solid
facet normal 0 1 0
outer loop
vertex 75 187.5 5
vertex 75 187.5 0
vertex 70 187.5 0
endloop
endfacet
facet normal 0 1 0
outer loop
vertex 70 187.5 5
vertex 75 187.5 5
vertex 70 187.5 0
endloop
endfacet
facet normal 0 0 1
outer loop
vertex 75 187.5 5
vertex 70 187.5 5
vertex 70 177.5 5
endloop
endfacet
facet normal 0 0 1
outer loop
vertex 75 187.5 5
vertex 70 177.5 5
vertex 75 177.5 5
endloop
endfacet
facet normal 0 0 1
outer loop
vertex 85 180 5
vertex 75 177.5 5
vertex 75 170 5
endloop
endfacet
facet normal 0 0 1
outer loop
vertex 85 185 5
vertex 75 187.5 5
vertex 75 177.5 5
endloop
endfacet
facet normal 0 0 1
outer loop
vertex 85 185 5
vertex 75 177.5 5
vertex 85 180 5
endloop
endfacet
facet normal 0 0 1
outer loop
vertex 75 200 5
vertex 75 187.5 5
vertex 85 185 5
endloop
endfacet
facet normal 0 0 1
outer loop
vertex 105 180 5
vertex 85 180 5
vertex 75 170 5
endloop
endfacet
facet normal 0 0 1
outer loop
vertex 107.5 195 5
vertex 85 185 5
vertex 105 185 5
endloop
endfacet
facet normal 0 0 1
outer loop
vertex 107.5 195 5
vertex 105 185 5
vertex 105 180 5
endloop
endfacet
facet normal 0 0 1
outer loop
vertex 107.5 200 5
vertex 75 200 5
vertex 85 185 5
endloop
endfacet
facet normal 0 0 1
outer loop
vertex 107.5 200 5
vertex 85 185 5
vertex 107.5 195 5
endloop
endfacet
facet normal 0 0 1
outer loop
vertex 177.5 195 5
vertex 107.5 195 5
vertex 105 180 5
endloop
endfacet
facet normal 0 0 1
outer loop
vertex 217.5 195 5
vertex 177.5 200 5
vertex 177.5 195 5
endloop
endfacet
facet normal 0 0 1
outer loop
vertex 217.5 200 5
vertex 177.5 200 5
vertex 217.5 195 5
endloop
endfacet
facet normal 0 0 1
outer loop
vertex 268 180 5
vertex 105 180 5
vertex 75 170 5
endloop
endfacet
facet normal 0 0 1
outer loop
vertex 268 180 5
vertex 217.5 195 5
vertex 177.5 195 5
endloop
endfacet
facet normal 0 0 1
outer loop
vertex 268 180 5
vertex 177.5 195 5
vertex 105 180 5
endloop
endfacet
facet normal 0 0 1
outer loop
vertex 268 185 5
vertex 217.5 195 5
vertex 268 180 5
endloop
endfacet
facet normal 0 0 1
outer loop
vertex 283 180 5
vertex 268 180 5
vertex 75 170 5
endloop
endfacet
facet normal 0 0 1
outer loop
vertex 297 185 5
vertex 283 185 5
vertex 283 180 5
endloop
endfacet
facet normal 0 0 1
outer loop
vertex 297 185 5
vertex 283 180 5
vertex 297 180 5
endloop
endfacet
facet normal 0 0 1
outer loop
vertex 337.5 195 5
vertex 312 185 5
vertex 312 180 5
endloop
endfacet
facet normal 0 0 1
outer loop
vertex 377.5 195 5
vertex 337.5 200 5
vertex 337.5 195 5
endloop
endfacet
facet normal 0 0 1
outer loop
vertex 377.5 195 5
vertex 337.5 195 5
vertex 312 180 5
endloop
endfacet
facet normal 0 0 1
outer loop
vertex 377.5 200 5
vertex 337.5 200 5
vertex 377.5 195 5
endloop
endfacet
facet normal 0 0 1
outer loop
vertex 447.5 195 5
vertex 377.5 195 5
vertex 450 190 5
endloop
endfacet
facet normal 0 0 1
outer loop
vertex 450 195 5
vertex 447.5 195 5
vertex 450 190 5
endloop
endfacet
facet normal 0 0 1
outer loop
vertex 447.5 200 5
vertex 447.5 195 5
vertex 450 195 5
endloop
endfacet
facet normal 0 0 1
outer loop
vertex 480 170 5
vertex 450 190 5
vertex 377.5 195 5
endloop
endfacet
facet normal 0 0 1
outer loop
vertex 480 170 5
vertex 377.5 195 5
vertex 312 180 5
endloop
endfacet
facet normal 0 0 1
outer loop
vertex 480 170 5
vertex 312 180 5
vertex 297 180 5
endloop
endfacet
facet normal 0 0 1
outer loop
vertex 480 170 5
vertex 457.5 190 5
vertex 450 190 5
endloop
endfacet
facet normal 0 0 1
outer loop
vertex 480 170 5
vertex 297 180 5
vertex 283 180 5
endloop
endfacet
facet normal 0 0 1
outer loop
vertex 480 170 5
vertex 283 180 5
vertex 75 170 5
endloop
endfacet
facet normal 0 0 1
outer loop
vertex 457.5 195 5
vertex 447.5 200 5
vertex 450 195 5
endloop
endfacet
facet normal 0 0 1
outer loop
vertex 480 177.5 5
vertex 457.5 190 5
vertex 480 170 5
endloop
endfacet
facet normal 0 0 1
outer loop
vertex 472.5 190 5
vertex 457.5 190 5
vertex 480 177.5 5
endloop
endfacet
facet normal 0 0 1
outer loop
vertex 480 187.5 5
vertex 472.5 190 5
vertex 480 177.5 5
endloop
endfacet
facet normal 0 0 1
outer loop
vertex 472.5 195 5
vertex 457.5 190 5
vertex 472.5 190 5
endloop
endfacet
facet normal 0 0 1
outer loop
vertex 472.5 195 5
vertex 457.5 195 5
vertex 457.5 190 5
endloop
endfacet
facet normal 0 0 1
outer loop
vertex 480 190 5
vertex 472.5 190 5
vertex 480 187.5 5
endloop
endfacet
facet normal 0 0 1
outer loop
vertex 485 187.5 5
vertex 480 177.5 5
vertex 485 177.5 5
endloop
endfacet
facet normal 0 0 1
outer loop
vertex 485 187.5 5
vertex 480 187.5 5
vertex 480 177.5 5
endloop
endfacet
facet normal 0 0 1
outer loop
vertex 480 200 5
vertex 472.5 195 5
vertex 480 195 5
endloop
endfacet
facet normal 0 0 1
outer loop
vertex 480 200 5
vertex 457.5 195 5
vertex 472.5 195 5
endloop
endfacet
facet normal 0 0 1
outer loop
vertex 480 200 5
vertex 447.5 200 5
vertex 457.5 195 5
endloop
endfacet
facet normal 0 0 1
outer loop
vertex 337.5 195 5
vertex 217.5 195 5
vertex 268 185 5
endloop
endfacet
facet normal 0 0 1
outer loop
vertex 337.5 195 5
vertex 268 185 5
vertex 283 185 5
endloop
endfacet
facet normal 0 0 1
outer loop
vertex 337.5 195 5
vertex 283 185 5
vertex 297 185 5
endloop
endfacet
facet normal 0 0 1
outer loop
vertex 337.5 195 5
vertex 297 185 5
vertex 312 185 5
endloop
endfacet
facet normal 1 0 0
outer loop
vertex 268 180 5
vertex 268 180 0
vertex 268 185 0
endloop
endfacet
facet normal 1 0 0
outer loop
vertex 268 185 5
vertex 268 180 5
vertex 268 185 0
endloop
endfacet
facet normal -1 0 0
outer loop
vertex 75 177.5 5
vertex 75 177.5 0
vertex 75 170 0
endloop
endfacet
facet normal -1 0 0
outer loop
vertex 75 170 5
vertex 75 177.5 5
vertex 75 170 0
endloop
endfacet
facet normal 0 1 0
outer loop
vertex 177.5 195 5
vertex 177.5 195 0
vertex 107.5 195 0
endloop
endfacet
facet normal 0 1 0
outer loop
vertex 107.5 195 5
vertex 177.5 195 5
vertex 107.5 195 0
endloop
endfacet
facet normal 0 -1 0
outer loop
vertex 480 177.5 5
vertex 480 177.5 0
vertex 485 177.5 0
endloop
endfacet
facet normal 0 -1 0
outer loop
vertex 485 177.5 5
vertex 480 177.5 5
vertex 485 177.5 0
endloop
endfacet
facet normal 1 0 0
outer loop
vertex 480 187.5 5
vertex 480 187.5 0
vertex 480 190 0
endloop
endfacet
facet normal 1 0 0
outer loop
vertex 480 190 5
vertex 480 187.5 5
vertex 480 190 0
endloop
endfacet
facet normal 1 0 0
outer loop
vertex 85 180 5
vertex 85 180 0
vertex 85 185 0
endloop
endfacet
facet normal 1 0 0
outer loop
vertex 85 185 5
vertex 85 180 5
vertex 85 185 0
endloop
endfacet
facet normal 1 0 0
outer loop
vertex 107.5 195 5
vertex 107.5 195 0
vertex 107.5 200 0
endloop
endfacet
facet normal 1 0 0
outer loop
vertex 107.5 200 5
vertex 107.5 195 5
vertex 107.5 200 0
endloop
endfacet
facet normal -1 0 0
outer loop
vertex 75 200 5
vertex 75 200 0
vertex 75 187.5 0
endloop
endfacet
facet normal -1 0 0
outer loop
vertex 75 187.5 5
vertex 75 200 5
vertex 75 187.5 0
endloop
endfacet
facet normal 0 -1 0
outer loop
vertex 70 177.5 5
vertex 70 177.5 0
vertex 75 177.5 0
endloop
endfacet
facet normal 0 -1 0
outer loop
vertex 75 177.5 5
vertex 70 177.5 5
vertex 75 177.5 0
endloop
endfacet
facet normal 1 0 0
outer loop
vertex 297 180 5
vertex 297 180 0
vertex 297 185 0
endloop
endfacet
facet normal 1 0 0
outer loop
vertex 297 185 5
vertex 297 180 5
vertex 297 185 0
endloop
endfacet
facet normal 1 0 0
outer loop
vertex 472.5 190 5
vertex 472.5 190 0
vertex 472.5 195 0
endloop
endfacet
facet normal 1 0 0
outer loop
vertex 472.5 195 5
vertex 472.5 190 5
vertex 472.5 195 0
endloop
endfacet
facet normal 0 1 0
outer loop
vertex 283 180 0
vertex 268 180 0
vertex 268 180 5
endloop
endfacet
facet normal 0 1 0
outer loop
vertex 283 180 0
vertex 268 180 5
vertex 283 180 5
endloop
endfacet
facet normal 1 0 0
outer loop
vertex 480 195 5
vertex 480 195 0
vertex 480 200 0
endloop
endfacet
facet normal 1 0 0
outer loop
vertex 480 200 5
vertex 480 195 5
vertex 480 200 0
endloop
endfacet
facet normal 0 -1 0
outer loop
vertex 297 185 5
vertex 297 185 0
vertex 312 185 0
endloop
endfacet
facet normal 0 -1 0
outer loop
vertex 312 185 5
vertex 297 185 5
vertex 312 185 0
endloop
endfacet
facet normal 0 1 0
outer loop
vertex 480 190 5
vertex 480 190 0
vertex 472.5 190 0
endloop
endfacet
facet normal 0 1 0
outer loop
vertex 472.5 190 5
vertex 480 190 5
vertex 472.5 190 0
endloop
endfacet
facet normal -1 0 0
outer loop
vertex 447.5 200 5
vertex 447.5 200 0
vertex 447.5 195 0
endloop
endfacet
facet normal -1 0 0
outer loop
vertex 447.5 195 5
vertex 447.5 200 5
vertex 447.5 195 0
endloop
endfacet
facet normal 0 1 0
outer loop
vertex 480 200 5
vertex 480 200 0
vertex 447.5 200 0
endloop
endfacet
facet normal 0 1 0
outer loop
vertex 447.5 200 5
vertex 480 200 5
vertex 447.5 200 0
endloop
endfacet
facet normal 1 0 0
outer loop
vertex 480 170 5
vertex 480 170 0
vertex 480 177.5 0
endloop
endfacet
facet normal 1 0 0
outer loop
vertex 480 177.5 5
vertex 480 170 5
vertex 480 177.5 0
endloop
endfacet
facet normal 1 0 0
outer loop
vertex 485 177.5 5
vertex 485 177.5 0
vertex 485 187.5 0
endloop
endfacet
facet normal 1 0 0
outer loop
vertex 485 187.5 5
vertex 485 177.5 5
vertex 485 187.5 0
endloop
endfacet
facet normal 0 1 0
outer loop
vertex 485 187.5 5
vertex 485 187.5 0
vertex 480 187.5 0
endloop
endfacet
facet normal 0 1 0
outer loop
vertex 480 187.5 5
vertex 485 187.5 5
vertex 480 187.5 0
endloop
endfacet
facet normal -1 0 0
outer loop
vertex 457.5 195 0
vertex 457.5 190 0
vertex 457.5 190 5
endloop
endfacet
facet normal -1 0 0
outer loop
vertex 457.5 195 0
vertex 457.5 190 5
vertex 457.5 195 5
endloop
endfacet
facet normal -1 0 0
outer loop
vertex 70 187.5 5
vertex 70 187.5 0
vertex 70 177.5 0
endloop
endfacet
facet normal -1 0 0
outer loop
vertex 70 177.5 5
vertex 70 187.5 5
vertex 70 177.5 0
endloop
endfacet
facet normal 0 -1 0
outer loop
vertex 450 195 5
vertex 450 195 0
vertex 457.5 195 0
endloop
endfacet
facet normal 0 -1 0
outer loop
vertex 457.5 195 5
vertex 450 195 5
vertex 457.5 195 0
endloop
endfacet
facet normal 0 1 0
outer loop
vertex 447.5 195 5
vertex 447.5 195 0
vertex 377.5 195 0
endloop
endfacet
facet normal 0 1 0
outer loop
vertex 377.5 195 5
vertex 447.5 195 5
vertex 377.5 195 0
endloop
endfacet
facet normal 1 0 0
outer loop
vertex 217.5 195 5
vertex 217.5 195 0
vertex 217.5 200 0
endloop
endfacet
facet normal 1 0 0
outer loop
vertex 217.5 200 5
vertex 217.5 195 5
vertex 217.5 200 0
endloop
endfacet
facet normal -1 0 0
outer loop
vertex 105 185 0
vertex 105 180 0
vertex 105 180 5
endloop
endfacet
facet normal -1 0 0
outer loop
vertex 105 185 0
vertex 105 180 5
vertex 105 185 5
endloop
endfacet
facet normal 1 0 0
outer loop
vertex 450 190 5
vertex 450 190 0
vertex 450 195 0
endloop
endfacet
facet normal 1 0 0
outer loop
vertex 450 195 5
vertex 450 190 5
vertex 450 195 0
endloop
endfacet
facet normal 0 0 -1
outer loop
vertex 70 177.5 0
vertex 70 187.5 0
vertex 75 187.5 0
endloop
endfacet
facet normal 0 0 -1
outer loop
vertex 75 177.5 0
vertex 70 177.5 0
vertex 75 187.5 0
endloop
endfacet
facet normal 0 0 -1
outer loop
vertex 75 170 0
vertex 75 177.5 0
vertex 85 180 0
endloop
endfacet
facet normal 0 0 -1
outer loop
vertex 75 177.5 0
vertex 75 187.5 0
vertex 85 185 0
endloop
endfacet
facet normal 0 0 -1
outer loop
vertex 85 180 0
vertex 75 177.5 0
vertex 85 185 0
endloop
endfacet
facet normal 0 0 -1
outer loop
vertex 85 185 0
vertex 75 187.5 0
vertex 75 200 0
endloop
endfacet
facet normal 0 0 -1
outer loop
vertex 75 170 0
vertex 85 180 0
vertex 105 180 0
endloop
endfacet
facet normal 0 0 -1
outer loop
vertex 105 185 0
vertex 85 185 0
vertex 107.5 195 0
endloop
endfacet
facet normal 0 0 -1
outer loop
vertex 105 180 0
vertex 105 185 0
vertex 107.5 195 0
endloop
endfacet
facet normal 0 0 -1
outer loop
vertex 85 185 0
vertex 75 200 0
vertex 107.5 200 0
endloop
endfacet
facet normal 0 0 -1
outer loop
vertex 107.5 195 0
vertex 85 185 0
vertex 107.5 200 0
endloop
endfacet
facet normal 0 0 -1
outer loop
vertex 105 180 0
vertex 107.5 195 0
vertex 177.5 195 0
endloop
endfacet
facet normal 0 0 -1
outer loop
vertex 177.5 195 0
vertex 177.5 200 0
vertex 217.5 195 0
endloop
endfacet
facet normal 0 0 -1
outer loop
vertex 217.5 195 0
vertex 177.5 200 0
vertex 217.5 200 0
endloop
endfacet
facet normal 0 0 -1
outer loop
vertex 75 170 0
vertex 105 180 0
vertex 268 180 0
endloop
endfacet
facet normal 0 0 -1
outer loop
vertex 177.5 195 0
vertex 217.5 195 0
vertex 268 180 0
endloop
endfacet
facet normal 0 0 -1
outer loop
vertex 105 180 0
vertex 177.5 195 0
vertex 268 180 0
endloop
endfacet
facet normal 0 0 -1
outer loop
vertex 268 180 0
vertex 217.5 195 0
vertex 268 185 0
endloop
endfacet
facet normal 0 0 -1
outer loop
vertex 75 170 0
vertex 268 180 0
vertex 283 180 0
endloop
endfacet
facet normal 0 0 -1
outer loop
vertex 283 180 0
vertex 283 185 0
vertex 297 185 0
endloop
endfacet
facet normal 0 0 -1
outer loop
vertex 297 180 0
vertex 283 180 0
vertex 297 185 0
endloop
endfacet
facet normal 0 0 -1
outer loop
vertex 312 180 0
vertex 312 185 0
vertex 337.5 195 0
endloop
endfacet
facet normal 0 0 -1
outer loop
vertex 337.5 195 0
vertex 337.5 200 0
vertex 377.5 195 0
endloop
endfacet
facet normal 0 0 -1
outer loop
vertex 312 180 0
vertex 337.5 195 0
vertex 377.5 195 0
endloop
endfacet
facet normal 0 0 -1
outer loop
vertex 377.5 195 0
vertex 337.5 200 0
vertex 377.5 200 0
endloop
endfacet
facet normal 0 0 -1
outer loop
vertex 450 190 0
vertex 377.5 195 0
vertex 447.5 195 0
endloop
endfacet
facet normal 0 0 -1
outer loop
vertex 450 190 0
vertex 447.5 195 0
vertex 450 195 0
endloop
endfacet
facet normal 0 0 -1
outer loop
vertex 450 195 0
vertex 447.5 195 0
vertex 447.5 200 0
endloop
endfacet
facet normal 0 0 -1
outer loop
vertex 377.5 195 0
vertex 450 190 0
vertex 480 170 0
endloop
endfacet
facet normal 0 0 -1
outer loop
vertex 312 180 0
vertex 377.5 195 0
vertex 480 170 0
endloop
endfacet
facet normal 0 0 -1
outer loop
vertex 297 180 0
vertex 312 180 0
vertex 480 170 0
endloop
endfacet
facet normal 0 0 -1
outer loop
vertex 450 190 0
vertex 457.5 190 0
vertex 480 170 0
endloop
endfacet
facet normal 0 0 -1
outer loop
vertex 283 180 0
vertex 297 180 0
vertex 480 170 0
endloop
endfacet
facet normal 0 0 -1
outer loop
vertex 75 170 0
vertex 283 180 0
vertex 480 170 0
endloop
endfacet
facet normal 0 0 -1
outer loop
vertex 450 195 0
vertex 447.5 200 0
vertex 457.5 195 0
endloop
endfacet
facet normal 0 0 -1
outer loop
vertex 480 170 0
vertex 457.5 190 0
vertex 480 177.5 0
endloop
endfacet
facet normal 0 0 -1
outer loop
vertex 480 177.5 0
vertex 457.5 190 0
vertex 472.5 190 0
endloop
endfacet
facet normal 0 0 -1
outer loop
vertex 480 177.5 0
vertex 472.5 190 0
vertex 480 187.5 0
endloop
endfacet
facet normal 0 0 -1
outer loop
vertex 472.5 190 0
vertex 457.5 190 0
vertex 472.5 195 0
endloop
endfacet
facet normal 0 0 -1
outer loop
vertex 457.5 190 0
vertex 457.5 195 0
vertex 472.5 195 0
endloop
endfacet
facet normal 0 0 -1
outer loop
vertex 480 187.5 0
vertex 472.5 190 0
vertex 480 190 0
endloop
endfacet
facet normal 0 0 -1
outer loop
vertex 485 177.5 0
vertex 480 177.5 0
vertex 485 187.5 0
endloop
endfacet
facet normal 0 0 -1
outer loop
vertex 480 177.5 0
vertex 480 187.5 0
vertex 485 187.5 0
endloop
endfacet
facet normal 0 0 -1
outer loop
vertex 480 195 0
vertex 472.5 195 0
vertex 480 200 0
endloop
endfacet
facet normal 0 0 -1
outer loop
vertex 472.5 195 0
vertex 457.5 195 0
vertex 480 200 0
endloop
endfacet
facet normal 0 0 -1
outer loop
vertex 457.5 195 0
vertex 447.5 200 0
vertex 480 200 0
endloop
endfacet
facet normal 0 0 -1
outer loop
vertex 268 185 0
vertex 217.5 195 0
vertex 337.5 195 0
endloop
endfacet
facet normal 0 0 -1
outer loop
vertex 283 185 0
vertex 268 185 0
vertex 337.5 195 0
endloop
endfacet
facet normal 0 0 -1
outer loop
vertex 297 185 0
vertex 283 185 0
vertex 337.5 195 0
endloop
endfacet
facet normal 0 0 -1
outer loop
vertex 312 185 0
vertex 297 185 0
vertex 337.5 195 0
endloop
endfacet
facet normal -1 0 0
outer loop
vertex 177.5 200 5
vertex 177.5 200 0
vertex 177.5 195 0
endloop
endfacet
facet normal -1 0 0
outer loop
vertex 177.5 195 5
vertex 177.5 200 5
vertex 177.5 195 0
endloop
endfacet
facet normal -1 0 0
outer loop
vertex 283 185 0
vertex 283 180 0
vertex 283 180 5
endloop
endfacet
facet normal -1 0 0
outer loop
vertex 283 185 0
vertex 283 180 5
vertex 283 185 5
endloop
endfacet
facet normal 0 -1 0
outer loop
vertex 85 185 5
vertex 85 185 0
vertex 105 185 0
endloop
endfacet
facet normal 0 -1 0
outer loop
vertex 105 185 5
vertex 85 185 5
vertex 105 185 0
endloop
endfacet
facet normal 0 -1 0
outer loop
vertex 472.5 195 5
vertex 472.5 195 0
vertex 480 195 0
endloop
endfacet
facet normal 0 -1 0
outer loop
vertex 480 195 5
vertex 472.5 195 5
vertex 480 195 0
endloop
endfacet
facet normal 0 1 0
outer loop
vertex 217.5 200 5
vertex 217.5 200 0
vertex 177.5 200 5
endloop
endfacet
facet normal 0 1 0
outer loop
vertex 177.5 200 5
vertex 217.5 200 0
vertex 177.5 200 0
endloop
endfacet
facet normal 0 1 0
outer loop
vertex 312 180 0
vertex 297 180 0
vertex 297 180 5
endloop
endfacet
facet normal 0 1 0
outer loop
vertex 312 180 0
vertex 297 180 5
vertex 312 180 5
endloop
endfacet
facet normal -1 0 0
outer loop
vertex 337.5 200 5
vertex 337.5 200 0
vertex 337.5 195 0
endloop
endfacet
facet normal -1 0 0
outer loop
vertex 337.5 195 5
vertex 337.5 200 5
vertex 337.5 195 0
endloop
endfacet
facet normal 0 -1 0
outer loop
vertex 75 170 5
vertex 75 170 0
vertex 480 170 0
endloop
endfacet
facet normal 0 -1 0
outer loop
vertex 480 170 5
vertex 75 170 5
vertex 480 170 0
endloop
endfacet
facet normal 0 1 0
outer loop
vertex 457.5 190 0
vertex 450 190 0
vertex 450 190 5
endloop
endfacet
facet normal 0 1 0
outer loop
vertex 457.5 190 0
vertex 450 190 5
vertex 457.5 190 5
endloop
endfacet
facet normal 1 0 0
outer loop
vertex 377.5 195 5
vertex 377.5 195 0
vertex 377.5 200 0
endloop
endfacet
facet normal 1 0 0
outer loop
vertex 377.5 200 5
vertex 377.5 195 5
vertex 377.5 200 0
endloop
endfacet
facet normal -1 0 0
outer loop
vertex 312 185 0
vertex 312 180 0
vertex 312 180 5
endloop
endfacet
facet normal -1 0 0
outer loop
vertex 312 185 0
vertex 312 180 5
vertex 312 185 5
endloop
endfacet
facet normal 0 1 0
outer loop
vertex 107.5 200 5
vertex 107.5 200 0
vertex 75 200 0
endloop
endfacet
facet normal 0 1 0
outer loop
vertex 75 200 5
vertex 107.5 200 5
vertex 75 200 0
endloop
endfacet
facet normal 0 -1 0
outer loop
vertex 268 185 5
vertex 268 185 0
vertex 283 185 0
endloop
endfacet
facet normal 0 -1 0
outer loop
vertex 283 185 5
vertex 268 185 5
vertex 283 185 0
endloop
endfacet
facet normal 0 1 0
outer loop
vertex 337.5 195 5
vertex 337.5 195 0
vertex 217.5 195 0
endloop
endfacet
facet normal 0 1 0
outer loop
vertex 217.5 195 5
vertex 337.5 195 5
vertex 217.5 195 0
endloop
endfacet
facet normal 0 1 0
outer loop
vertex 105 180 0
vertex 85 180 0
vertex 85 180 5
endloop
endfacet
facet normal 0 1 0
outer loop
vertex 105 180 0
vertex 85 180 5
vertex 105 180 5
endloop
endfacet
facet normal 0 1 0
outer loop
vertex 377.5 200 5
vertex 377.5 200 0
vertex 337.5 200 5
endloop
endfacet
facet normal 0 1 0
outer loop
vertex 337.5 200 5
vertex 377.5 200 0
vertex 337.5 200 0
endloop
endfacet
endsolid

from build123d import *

# Parameters (mm, degrees)
SKETCH1_W           = 7.5
SKETCH1_H           = 5
SKETCH1_W_2         = 20
SKETCH1_W_3         = 15
BOSS_EXTRUDE1_DEPTH = 5


with BuildPart() as part:
    # Sketch1 → Boss-Extrude1 (new body)
    with BuildSketch(Plane.XY):
        Polygon((480, 177.5), (485, 177.5), (485, 187.5), (480, 187.5), (480, 190), (472.5, 190), (472.5, 195), (480, 195), (480, 200), (447.5, 200), (447.5, 195), (377.5, 195), (377.5, 200), (337.5, 200), (337.5, 195), (217.5, 195), (217.5, 200), (177.5, 200), (177.5, 195), (107.5, 195), (107.5, 200), (75, 200), (75, 195), (75, 187.5), (70, 187.5), (70, 177.5), (75, 177.5), (75, 170), (480, 170), align=None)
        with Locations((453.75, 192.5)):
            Rectangle(SKETCH1_W, SKETCH1_H, mode=Mode.SUBTRACT)
        with Locations((95, 182.5)):
            Rectangle(SKETCH1_W_2, SKETCH1_H, mode=Mode.SUBTRACT)
        with Locations((304.5, 182.5)):
            Rectangle(SKETCH1_W_3, SKETCH1_H, mode=Mode.SUBTRACT)
        with Locations((275.5, 182.5)):
            Rectangle(SKETCH1_W_3, SKETCH1_H, mode=Mode.SUBTRACT)
    extrude(amount=BOSS_EXTRUDE1_DEPTH)


solid = part.part
